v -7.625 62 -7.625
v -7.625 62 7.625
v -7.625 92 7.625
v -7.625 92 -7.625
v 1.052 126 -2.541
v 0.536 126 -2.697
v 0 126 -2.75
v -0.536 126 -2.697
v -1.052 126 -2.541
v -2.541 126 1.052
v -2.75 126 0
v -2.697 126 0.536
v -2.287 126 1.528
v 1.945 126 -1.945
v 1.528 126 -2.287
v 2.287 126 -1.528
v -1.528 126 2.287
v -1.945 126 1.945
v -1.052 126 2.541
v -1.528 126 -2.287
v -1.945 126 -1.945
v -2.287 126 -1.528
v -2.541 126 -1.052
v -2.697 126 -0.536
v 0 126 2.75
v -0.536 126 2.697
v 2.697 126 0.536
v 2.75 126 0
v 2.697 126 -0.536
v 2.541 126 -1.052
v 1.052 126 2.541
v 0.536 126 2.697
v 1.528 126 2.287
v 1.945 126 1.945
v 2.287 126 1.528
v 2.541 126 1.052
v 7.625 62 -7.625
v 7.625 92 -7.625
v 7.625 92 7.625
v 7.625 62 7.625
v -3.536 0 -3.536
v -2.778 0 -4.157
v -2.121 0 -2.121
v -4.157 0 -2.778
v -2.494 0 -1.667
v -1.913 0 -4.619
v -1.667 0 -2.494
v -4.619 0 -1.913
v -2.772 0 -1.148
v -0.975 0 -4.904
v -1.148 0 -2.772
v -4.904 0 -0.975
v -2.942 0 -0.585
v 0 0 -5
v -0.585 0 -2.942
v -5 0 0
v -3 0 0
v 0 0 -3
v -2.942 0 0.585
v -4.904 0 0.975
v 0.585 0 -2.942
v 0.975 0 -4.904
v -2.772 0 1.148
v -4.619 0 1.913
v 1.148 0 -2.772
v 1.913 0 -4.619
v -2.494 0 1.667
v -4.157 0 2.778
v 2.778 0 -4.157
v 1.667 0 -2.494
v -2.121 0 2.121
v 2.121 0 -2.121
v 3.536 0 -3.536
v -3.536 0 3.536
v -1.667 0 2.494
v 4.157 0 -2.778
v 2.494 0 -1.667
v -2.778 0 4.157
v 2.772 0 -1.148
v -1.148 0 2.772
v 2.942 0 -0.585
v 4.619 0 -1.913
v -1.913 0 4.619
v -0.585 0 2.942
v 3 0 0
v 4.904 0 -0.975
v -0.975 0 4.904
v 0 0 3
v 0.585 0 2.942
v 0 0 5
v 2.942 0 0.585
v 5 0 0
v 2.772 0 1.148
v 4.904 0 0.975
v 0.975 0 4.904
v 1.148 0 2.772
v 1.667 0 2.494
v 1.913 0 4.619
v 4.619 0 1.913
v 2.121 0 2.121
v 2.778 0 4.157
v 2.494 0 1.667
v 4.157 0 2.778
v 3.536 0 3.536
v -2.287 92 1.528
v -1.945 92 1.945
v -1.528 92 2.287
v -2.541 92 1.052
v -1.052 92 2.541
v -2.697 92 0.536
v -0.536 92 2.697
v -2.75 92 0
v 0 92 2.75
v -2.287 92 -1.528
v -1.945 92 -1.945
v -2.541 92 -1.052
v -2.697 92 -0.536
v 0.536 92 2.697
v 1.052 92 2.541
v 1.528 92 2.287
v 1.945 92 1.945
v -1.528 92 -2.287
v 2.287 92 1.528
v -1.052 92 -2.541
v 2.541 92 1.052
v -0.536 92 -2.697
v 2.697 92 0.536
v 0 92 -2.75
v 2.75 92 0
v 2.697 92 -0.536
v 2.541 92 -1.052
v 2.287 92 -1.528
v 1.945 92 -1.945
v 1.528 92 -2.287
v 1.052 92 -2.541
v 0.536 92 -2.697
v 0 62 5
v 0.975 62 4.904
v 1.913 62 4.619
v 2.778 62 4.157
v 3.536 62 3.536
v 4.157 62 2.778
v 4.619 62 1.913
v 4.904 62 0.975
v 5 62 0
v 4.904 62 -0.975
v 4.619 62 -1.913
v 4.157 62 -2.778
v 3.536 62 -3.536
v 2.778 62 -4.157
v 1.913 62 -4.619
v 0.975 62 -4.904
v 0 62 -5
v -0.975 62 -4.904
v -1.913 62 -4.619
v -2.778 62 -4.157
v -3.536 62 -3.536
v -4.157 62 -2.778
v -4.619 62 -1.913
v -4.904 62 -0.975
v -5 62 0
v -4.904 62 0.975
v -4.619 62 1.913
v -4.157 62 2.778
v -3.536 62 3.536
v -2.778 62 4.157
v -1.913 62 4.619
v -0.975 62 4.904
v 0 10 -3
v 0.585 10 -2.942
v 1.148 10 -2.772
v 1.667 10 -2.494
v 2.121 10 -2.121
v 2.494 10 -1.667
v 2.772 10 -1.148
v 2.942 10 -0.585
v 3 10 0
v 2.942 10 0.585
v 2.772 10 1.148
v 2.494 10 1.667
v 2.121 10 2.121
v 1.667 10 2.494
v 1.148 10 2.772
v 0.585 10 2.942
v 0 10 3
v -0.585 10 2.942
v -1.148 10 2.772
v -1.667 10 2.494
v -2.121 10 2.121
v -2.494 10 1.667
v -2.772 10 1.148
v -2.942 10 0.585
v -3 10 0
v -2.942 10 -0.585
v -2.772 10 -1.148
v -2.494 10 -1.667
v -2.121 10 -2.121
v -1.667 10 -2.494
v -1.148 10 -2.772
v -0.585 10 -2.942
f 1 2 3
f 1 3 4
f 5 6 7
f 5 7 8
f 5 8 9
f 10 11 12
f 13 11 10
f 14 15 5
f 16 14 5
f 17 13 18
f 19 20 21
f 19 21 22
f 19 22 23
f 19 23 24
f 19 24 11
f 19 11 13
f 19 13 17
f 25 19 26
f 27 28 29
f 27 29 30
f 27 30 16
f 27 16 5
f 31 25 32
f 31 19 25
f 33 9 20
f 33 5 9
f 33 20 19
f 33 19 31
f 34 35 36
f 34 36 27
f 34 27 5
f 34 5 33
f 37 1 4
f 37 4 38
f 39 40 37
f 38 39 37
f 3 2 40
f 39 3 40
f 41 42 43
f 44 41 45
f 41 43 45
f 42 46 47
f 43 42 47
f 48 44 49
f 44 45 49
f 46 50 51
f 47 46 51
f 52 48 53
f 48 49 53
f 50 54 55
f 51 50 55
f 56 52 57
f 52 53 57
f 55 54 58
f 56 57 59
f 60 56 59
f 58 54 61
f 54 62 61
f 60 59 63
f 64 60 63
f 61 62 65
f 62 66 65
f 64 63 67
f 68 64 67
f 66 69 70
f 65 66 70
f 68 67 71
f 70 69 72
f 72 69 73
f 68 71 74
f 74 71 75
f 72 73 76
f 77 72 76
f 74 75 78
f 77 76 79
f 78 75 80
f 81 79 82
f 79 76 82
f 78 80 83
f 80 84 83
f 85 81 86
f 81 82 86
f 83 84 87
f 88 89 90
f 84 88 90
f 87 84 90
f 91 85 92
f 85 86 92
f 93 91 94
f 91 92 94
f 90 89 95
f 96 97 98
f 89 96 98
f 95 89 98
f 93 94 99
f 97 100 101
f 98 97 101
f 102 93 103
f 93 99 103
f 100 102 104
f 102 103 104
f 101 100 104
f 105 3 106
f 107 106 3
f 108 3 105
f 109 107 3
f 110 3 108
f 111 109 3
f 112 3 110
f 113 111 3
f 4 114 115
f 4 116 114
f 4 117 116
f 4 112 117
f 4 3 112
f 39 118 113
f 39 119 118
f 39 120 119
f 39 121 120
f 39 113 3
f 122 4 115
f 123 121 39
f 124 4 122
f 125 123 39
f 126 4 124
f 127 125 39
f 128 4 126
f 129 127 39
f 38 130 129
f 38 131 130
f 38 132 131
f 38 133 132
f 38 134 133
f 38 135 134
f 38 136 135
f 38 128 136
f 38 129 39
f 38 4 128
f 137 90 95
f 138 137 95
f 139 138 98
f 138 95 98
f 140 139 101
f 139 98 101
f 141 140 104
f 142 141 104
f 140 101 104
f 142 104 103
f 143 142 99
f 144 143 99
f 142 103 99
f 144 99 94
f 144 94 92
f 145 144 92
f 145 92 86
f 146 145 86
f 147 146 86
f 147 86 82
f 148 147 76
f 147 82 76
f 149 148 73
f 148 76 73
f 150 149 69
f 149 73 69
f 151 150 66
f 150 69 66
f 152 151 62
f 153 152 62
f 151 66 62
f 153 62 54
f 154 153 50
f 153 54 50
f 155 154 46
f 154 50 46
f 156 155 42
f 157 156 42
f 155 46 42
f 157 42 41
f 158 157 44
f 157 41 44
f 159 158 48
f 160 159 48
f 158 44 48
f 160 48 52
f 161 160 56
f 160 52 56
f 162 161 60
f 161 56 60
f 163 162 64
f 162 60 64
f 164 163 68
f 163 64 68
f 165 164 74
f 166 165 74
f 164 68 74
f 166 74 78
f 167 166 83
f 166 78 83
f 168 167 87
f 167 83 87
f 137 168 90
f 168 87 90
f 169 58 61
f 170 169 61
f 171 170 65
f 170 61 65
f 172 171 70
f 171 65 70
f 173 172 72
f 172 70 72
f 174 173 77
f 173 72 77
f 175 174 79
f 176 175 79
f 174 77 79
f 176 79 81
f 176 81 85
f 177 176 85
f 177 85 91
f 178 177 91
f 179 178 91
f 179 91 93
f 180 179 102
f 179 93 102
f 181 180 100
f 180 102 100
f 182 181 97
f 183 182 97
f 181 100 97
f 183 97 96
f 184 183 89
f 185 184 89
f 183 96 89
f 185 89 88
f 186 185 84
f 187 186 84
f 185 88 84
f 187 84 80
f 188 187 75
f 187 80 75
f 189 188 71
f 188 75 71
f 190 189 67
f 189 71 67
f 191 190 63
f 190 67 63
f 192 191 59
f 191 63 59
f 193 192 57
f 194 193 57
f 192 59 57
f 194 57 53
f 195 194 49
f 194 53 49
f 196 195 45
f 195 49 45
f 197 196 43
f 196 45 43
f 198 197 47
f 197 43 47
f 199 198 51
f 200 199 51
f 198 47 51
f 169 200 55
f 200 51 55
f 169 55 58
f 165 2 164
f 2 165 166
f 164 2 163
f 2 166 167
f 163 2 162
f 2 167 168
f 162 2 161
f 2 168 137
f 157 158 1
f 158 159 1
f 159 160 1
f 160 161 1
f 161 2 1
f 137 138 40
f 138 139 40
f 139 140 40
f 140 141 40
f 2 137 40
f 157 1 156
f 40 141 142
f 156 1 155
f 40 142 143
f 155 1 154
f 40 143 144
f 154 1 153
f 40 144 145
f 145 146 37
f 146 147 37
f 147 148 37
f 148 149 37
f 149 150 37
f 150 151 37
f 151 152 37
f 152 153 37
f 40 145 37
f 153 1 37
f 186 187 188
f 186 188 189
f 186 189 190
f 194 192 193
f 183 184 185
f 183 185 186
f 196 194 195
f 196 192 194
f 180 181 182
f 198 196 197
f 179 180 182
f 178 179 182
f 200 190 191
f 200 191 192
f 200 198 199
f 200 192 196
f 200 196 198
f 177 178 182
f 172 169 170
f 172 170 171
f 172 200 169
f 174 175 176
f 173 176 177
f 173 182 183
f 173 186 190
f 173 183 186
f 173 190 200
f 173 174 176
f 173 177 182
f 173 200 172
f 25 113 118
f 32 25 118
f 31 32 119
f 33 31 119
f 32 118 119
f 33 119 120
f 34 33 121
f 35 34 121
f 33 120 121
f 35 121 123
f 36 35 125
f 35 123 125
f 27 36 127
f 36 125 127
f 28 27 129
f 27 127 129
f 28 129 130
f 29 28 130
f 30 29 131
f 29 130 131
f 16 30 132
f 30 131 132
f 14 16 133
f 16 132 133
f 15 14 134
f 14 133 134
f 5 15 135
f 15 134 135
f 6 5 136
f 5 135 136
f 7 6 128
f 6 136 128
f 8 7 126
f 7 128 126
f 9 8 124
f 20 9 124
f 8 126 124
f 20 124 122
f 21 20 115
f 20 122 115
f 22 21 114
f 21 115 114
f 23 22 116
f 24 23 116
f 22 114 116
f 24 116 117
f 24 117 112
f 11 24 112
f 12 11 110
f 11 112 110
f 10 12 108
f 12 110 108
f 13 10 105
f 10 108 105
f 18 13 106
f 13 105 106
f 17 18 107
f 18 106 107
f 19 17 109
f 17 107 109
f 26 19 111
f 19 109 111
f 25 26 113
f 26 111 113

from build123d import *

# Parameters (mm, degrees)
SKETCH1_R           = 5
BOSS_EXTRUDE1_DEPTH = 62
SKETCH3_W           = 15.25
SKETCH3_H           = 15.25
BOSS_EXTRUDE2_DEPTH = 30
SKETCH5_R           = 3
CUT_EXTRUDE1_DEPTH  = 10
SKETCH4_R           = 2.75
BOSS_EXTRUDE3_DEPTH = 34


with BuildPart() as part:
    # Sketch1 → Boss-Extrude1 (new body)
    with BuildSketch(Plane(origin=(0, 0, 0), x_dir=(1, 0, 0), z_dir=(0, 1, 0))):
        with Locations(Location((0, 0, 0), (0, 0, 270))):
            Circle(SKETCH1_R)
    extrude(amount=BOSS_EXTRUDE1_DEPTH)

    # Sketch3 → Boss-Extrude2 (add)
    with BuildSketch(Plane(origin=(0, 62, 0), x_dir=(1, 0, 0), z_dir=(0, 1, 0))):
        Rectangle(SKETCH3_W, SKETCH3_H)
    extrude(amount=BOSS_EXTRUDE2_DEPTH)

    # Sketch5 → Cut-Extrude1 (cut)
    with BuildSketch(Plane.XZ):
        with Locations(Location((0, 0, 0), (0, 0, 270))):
            Circle(SKETCH5_R)
    extrude(amount=-CUT_EXTRUDE1_DEPTH, mode=Mode.SUBTRACT)

    # Sketch4 → Boss-Extrude3 (add)
    with BuildSketch(Plane(origin=(0, 92, 0), x_dir=(1, 0, 0), z_dir=(0, 1, 0))):
        with Locations(Location((0, 0, 0), (0, 0, 270))):
            Circle(SKETCH4_R)
    extrude(amount=BOSS_EXTRUDE3_DEPTH)


solid = part.part
